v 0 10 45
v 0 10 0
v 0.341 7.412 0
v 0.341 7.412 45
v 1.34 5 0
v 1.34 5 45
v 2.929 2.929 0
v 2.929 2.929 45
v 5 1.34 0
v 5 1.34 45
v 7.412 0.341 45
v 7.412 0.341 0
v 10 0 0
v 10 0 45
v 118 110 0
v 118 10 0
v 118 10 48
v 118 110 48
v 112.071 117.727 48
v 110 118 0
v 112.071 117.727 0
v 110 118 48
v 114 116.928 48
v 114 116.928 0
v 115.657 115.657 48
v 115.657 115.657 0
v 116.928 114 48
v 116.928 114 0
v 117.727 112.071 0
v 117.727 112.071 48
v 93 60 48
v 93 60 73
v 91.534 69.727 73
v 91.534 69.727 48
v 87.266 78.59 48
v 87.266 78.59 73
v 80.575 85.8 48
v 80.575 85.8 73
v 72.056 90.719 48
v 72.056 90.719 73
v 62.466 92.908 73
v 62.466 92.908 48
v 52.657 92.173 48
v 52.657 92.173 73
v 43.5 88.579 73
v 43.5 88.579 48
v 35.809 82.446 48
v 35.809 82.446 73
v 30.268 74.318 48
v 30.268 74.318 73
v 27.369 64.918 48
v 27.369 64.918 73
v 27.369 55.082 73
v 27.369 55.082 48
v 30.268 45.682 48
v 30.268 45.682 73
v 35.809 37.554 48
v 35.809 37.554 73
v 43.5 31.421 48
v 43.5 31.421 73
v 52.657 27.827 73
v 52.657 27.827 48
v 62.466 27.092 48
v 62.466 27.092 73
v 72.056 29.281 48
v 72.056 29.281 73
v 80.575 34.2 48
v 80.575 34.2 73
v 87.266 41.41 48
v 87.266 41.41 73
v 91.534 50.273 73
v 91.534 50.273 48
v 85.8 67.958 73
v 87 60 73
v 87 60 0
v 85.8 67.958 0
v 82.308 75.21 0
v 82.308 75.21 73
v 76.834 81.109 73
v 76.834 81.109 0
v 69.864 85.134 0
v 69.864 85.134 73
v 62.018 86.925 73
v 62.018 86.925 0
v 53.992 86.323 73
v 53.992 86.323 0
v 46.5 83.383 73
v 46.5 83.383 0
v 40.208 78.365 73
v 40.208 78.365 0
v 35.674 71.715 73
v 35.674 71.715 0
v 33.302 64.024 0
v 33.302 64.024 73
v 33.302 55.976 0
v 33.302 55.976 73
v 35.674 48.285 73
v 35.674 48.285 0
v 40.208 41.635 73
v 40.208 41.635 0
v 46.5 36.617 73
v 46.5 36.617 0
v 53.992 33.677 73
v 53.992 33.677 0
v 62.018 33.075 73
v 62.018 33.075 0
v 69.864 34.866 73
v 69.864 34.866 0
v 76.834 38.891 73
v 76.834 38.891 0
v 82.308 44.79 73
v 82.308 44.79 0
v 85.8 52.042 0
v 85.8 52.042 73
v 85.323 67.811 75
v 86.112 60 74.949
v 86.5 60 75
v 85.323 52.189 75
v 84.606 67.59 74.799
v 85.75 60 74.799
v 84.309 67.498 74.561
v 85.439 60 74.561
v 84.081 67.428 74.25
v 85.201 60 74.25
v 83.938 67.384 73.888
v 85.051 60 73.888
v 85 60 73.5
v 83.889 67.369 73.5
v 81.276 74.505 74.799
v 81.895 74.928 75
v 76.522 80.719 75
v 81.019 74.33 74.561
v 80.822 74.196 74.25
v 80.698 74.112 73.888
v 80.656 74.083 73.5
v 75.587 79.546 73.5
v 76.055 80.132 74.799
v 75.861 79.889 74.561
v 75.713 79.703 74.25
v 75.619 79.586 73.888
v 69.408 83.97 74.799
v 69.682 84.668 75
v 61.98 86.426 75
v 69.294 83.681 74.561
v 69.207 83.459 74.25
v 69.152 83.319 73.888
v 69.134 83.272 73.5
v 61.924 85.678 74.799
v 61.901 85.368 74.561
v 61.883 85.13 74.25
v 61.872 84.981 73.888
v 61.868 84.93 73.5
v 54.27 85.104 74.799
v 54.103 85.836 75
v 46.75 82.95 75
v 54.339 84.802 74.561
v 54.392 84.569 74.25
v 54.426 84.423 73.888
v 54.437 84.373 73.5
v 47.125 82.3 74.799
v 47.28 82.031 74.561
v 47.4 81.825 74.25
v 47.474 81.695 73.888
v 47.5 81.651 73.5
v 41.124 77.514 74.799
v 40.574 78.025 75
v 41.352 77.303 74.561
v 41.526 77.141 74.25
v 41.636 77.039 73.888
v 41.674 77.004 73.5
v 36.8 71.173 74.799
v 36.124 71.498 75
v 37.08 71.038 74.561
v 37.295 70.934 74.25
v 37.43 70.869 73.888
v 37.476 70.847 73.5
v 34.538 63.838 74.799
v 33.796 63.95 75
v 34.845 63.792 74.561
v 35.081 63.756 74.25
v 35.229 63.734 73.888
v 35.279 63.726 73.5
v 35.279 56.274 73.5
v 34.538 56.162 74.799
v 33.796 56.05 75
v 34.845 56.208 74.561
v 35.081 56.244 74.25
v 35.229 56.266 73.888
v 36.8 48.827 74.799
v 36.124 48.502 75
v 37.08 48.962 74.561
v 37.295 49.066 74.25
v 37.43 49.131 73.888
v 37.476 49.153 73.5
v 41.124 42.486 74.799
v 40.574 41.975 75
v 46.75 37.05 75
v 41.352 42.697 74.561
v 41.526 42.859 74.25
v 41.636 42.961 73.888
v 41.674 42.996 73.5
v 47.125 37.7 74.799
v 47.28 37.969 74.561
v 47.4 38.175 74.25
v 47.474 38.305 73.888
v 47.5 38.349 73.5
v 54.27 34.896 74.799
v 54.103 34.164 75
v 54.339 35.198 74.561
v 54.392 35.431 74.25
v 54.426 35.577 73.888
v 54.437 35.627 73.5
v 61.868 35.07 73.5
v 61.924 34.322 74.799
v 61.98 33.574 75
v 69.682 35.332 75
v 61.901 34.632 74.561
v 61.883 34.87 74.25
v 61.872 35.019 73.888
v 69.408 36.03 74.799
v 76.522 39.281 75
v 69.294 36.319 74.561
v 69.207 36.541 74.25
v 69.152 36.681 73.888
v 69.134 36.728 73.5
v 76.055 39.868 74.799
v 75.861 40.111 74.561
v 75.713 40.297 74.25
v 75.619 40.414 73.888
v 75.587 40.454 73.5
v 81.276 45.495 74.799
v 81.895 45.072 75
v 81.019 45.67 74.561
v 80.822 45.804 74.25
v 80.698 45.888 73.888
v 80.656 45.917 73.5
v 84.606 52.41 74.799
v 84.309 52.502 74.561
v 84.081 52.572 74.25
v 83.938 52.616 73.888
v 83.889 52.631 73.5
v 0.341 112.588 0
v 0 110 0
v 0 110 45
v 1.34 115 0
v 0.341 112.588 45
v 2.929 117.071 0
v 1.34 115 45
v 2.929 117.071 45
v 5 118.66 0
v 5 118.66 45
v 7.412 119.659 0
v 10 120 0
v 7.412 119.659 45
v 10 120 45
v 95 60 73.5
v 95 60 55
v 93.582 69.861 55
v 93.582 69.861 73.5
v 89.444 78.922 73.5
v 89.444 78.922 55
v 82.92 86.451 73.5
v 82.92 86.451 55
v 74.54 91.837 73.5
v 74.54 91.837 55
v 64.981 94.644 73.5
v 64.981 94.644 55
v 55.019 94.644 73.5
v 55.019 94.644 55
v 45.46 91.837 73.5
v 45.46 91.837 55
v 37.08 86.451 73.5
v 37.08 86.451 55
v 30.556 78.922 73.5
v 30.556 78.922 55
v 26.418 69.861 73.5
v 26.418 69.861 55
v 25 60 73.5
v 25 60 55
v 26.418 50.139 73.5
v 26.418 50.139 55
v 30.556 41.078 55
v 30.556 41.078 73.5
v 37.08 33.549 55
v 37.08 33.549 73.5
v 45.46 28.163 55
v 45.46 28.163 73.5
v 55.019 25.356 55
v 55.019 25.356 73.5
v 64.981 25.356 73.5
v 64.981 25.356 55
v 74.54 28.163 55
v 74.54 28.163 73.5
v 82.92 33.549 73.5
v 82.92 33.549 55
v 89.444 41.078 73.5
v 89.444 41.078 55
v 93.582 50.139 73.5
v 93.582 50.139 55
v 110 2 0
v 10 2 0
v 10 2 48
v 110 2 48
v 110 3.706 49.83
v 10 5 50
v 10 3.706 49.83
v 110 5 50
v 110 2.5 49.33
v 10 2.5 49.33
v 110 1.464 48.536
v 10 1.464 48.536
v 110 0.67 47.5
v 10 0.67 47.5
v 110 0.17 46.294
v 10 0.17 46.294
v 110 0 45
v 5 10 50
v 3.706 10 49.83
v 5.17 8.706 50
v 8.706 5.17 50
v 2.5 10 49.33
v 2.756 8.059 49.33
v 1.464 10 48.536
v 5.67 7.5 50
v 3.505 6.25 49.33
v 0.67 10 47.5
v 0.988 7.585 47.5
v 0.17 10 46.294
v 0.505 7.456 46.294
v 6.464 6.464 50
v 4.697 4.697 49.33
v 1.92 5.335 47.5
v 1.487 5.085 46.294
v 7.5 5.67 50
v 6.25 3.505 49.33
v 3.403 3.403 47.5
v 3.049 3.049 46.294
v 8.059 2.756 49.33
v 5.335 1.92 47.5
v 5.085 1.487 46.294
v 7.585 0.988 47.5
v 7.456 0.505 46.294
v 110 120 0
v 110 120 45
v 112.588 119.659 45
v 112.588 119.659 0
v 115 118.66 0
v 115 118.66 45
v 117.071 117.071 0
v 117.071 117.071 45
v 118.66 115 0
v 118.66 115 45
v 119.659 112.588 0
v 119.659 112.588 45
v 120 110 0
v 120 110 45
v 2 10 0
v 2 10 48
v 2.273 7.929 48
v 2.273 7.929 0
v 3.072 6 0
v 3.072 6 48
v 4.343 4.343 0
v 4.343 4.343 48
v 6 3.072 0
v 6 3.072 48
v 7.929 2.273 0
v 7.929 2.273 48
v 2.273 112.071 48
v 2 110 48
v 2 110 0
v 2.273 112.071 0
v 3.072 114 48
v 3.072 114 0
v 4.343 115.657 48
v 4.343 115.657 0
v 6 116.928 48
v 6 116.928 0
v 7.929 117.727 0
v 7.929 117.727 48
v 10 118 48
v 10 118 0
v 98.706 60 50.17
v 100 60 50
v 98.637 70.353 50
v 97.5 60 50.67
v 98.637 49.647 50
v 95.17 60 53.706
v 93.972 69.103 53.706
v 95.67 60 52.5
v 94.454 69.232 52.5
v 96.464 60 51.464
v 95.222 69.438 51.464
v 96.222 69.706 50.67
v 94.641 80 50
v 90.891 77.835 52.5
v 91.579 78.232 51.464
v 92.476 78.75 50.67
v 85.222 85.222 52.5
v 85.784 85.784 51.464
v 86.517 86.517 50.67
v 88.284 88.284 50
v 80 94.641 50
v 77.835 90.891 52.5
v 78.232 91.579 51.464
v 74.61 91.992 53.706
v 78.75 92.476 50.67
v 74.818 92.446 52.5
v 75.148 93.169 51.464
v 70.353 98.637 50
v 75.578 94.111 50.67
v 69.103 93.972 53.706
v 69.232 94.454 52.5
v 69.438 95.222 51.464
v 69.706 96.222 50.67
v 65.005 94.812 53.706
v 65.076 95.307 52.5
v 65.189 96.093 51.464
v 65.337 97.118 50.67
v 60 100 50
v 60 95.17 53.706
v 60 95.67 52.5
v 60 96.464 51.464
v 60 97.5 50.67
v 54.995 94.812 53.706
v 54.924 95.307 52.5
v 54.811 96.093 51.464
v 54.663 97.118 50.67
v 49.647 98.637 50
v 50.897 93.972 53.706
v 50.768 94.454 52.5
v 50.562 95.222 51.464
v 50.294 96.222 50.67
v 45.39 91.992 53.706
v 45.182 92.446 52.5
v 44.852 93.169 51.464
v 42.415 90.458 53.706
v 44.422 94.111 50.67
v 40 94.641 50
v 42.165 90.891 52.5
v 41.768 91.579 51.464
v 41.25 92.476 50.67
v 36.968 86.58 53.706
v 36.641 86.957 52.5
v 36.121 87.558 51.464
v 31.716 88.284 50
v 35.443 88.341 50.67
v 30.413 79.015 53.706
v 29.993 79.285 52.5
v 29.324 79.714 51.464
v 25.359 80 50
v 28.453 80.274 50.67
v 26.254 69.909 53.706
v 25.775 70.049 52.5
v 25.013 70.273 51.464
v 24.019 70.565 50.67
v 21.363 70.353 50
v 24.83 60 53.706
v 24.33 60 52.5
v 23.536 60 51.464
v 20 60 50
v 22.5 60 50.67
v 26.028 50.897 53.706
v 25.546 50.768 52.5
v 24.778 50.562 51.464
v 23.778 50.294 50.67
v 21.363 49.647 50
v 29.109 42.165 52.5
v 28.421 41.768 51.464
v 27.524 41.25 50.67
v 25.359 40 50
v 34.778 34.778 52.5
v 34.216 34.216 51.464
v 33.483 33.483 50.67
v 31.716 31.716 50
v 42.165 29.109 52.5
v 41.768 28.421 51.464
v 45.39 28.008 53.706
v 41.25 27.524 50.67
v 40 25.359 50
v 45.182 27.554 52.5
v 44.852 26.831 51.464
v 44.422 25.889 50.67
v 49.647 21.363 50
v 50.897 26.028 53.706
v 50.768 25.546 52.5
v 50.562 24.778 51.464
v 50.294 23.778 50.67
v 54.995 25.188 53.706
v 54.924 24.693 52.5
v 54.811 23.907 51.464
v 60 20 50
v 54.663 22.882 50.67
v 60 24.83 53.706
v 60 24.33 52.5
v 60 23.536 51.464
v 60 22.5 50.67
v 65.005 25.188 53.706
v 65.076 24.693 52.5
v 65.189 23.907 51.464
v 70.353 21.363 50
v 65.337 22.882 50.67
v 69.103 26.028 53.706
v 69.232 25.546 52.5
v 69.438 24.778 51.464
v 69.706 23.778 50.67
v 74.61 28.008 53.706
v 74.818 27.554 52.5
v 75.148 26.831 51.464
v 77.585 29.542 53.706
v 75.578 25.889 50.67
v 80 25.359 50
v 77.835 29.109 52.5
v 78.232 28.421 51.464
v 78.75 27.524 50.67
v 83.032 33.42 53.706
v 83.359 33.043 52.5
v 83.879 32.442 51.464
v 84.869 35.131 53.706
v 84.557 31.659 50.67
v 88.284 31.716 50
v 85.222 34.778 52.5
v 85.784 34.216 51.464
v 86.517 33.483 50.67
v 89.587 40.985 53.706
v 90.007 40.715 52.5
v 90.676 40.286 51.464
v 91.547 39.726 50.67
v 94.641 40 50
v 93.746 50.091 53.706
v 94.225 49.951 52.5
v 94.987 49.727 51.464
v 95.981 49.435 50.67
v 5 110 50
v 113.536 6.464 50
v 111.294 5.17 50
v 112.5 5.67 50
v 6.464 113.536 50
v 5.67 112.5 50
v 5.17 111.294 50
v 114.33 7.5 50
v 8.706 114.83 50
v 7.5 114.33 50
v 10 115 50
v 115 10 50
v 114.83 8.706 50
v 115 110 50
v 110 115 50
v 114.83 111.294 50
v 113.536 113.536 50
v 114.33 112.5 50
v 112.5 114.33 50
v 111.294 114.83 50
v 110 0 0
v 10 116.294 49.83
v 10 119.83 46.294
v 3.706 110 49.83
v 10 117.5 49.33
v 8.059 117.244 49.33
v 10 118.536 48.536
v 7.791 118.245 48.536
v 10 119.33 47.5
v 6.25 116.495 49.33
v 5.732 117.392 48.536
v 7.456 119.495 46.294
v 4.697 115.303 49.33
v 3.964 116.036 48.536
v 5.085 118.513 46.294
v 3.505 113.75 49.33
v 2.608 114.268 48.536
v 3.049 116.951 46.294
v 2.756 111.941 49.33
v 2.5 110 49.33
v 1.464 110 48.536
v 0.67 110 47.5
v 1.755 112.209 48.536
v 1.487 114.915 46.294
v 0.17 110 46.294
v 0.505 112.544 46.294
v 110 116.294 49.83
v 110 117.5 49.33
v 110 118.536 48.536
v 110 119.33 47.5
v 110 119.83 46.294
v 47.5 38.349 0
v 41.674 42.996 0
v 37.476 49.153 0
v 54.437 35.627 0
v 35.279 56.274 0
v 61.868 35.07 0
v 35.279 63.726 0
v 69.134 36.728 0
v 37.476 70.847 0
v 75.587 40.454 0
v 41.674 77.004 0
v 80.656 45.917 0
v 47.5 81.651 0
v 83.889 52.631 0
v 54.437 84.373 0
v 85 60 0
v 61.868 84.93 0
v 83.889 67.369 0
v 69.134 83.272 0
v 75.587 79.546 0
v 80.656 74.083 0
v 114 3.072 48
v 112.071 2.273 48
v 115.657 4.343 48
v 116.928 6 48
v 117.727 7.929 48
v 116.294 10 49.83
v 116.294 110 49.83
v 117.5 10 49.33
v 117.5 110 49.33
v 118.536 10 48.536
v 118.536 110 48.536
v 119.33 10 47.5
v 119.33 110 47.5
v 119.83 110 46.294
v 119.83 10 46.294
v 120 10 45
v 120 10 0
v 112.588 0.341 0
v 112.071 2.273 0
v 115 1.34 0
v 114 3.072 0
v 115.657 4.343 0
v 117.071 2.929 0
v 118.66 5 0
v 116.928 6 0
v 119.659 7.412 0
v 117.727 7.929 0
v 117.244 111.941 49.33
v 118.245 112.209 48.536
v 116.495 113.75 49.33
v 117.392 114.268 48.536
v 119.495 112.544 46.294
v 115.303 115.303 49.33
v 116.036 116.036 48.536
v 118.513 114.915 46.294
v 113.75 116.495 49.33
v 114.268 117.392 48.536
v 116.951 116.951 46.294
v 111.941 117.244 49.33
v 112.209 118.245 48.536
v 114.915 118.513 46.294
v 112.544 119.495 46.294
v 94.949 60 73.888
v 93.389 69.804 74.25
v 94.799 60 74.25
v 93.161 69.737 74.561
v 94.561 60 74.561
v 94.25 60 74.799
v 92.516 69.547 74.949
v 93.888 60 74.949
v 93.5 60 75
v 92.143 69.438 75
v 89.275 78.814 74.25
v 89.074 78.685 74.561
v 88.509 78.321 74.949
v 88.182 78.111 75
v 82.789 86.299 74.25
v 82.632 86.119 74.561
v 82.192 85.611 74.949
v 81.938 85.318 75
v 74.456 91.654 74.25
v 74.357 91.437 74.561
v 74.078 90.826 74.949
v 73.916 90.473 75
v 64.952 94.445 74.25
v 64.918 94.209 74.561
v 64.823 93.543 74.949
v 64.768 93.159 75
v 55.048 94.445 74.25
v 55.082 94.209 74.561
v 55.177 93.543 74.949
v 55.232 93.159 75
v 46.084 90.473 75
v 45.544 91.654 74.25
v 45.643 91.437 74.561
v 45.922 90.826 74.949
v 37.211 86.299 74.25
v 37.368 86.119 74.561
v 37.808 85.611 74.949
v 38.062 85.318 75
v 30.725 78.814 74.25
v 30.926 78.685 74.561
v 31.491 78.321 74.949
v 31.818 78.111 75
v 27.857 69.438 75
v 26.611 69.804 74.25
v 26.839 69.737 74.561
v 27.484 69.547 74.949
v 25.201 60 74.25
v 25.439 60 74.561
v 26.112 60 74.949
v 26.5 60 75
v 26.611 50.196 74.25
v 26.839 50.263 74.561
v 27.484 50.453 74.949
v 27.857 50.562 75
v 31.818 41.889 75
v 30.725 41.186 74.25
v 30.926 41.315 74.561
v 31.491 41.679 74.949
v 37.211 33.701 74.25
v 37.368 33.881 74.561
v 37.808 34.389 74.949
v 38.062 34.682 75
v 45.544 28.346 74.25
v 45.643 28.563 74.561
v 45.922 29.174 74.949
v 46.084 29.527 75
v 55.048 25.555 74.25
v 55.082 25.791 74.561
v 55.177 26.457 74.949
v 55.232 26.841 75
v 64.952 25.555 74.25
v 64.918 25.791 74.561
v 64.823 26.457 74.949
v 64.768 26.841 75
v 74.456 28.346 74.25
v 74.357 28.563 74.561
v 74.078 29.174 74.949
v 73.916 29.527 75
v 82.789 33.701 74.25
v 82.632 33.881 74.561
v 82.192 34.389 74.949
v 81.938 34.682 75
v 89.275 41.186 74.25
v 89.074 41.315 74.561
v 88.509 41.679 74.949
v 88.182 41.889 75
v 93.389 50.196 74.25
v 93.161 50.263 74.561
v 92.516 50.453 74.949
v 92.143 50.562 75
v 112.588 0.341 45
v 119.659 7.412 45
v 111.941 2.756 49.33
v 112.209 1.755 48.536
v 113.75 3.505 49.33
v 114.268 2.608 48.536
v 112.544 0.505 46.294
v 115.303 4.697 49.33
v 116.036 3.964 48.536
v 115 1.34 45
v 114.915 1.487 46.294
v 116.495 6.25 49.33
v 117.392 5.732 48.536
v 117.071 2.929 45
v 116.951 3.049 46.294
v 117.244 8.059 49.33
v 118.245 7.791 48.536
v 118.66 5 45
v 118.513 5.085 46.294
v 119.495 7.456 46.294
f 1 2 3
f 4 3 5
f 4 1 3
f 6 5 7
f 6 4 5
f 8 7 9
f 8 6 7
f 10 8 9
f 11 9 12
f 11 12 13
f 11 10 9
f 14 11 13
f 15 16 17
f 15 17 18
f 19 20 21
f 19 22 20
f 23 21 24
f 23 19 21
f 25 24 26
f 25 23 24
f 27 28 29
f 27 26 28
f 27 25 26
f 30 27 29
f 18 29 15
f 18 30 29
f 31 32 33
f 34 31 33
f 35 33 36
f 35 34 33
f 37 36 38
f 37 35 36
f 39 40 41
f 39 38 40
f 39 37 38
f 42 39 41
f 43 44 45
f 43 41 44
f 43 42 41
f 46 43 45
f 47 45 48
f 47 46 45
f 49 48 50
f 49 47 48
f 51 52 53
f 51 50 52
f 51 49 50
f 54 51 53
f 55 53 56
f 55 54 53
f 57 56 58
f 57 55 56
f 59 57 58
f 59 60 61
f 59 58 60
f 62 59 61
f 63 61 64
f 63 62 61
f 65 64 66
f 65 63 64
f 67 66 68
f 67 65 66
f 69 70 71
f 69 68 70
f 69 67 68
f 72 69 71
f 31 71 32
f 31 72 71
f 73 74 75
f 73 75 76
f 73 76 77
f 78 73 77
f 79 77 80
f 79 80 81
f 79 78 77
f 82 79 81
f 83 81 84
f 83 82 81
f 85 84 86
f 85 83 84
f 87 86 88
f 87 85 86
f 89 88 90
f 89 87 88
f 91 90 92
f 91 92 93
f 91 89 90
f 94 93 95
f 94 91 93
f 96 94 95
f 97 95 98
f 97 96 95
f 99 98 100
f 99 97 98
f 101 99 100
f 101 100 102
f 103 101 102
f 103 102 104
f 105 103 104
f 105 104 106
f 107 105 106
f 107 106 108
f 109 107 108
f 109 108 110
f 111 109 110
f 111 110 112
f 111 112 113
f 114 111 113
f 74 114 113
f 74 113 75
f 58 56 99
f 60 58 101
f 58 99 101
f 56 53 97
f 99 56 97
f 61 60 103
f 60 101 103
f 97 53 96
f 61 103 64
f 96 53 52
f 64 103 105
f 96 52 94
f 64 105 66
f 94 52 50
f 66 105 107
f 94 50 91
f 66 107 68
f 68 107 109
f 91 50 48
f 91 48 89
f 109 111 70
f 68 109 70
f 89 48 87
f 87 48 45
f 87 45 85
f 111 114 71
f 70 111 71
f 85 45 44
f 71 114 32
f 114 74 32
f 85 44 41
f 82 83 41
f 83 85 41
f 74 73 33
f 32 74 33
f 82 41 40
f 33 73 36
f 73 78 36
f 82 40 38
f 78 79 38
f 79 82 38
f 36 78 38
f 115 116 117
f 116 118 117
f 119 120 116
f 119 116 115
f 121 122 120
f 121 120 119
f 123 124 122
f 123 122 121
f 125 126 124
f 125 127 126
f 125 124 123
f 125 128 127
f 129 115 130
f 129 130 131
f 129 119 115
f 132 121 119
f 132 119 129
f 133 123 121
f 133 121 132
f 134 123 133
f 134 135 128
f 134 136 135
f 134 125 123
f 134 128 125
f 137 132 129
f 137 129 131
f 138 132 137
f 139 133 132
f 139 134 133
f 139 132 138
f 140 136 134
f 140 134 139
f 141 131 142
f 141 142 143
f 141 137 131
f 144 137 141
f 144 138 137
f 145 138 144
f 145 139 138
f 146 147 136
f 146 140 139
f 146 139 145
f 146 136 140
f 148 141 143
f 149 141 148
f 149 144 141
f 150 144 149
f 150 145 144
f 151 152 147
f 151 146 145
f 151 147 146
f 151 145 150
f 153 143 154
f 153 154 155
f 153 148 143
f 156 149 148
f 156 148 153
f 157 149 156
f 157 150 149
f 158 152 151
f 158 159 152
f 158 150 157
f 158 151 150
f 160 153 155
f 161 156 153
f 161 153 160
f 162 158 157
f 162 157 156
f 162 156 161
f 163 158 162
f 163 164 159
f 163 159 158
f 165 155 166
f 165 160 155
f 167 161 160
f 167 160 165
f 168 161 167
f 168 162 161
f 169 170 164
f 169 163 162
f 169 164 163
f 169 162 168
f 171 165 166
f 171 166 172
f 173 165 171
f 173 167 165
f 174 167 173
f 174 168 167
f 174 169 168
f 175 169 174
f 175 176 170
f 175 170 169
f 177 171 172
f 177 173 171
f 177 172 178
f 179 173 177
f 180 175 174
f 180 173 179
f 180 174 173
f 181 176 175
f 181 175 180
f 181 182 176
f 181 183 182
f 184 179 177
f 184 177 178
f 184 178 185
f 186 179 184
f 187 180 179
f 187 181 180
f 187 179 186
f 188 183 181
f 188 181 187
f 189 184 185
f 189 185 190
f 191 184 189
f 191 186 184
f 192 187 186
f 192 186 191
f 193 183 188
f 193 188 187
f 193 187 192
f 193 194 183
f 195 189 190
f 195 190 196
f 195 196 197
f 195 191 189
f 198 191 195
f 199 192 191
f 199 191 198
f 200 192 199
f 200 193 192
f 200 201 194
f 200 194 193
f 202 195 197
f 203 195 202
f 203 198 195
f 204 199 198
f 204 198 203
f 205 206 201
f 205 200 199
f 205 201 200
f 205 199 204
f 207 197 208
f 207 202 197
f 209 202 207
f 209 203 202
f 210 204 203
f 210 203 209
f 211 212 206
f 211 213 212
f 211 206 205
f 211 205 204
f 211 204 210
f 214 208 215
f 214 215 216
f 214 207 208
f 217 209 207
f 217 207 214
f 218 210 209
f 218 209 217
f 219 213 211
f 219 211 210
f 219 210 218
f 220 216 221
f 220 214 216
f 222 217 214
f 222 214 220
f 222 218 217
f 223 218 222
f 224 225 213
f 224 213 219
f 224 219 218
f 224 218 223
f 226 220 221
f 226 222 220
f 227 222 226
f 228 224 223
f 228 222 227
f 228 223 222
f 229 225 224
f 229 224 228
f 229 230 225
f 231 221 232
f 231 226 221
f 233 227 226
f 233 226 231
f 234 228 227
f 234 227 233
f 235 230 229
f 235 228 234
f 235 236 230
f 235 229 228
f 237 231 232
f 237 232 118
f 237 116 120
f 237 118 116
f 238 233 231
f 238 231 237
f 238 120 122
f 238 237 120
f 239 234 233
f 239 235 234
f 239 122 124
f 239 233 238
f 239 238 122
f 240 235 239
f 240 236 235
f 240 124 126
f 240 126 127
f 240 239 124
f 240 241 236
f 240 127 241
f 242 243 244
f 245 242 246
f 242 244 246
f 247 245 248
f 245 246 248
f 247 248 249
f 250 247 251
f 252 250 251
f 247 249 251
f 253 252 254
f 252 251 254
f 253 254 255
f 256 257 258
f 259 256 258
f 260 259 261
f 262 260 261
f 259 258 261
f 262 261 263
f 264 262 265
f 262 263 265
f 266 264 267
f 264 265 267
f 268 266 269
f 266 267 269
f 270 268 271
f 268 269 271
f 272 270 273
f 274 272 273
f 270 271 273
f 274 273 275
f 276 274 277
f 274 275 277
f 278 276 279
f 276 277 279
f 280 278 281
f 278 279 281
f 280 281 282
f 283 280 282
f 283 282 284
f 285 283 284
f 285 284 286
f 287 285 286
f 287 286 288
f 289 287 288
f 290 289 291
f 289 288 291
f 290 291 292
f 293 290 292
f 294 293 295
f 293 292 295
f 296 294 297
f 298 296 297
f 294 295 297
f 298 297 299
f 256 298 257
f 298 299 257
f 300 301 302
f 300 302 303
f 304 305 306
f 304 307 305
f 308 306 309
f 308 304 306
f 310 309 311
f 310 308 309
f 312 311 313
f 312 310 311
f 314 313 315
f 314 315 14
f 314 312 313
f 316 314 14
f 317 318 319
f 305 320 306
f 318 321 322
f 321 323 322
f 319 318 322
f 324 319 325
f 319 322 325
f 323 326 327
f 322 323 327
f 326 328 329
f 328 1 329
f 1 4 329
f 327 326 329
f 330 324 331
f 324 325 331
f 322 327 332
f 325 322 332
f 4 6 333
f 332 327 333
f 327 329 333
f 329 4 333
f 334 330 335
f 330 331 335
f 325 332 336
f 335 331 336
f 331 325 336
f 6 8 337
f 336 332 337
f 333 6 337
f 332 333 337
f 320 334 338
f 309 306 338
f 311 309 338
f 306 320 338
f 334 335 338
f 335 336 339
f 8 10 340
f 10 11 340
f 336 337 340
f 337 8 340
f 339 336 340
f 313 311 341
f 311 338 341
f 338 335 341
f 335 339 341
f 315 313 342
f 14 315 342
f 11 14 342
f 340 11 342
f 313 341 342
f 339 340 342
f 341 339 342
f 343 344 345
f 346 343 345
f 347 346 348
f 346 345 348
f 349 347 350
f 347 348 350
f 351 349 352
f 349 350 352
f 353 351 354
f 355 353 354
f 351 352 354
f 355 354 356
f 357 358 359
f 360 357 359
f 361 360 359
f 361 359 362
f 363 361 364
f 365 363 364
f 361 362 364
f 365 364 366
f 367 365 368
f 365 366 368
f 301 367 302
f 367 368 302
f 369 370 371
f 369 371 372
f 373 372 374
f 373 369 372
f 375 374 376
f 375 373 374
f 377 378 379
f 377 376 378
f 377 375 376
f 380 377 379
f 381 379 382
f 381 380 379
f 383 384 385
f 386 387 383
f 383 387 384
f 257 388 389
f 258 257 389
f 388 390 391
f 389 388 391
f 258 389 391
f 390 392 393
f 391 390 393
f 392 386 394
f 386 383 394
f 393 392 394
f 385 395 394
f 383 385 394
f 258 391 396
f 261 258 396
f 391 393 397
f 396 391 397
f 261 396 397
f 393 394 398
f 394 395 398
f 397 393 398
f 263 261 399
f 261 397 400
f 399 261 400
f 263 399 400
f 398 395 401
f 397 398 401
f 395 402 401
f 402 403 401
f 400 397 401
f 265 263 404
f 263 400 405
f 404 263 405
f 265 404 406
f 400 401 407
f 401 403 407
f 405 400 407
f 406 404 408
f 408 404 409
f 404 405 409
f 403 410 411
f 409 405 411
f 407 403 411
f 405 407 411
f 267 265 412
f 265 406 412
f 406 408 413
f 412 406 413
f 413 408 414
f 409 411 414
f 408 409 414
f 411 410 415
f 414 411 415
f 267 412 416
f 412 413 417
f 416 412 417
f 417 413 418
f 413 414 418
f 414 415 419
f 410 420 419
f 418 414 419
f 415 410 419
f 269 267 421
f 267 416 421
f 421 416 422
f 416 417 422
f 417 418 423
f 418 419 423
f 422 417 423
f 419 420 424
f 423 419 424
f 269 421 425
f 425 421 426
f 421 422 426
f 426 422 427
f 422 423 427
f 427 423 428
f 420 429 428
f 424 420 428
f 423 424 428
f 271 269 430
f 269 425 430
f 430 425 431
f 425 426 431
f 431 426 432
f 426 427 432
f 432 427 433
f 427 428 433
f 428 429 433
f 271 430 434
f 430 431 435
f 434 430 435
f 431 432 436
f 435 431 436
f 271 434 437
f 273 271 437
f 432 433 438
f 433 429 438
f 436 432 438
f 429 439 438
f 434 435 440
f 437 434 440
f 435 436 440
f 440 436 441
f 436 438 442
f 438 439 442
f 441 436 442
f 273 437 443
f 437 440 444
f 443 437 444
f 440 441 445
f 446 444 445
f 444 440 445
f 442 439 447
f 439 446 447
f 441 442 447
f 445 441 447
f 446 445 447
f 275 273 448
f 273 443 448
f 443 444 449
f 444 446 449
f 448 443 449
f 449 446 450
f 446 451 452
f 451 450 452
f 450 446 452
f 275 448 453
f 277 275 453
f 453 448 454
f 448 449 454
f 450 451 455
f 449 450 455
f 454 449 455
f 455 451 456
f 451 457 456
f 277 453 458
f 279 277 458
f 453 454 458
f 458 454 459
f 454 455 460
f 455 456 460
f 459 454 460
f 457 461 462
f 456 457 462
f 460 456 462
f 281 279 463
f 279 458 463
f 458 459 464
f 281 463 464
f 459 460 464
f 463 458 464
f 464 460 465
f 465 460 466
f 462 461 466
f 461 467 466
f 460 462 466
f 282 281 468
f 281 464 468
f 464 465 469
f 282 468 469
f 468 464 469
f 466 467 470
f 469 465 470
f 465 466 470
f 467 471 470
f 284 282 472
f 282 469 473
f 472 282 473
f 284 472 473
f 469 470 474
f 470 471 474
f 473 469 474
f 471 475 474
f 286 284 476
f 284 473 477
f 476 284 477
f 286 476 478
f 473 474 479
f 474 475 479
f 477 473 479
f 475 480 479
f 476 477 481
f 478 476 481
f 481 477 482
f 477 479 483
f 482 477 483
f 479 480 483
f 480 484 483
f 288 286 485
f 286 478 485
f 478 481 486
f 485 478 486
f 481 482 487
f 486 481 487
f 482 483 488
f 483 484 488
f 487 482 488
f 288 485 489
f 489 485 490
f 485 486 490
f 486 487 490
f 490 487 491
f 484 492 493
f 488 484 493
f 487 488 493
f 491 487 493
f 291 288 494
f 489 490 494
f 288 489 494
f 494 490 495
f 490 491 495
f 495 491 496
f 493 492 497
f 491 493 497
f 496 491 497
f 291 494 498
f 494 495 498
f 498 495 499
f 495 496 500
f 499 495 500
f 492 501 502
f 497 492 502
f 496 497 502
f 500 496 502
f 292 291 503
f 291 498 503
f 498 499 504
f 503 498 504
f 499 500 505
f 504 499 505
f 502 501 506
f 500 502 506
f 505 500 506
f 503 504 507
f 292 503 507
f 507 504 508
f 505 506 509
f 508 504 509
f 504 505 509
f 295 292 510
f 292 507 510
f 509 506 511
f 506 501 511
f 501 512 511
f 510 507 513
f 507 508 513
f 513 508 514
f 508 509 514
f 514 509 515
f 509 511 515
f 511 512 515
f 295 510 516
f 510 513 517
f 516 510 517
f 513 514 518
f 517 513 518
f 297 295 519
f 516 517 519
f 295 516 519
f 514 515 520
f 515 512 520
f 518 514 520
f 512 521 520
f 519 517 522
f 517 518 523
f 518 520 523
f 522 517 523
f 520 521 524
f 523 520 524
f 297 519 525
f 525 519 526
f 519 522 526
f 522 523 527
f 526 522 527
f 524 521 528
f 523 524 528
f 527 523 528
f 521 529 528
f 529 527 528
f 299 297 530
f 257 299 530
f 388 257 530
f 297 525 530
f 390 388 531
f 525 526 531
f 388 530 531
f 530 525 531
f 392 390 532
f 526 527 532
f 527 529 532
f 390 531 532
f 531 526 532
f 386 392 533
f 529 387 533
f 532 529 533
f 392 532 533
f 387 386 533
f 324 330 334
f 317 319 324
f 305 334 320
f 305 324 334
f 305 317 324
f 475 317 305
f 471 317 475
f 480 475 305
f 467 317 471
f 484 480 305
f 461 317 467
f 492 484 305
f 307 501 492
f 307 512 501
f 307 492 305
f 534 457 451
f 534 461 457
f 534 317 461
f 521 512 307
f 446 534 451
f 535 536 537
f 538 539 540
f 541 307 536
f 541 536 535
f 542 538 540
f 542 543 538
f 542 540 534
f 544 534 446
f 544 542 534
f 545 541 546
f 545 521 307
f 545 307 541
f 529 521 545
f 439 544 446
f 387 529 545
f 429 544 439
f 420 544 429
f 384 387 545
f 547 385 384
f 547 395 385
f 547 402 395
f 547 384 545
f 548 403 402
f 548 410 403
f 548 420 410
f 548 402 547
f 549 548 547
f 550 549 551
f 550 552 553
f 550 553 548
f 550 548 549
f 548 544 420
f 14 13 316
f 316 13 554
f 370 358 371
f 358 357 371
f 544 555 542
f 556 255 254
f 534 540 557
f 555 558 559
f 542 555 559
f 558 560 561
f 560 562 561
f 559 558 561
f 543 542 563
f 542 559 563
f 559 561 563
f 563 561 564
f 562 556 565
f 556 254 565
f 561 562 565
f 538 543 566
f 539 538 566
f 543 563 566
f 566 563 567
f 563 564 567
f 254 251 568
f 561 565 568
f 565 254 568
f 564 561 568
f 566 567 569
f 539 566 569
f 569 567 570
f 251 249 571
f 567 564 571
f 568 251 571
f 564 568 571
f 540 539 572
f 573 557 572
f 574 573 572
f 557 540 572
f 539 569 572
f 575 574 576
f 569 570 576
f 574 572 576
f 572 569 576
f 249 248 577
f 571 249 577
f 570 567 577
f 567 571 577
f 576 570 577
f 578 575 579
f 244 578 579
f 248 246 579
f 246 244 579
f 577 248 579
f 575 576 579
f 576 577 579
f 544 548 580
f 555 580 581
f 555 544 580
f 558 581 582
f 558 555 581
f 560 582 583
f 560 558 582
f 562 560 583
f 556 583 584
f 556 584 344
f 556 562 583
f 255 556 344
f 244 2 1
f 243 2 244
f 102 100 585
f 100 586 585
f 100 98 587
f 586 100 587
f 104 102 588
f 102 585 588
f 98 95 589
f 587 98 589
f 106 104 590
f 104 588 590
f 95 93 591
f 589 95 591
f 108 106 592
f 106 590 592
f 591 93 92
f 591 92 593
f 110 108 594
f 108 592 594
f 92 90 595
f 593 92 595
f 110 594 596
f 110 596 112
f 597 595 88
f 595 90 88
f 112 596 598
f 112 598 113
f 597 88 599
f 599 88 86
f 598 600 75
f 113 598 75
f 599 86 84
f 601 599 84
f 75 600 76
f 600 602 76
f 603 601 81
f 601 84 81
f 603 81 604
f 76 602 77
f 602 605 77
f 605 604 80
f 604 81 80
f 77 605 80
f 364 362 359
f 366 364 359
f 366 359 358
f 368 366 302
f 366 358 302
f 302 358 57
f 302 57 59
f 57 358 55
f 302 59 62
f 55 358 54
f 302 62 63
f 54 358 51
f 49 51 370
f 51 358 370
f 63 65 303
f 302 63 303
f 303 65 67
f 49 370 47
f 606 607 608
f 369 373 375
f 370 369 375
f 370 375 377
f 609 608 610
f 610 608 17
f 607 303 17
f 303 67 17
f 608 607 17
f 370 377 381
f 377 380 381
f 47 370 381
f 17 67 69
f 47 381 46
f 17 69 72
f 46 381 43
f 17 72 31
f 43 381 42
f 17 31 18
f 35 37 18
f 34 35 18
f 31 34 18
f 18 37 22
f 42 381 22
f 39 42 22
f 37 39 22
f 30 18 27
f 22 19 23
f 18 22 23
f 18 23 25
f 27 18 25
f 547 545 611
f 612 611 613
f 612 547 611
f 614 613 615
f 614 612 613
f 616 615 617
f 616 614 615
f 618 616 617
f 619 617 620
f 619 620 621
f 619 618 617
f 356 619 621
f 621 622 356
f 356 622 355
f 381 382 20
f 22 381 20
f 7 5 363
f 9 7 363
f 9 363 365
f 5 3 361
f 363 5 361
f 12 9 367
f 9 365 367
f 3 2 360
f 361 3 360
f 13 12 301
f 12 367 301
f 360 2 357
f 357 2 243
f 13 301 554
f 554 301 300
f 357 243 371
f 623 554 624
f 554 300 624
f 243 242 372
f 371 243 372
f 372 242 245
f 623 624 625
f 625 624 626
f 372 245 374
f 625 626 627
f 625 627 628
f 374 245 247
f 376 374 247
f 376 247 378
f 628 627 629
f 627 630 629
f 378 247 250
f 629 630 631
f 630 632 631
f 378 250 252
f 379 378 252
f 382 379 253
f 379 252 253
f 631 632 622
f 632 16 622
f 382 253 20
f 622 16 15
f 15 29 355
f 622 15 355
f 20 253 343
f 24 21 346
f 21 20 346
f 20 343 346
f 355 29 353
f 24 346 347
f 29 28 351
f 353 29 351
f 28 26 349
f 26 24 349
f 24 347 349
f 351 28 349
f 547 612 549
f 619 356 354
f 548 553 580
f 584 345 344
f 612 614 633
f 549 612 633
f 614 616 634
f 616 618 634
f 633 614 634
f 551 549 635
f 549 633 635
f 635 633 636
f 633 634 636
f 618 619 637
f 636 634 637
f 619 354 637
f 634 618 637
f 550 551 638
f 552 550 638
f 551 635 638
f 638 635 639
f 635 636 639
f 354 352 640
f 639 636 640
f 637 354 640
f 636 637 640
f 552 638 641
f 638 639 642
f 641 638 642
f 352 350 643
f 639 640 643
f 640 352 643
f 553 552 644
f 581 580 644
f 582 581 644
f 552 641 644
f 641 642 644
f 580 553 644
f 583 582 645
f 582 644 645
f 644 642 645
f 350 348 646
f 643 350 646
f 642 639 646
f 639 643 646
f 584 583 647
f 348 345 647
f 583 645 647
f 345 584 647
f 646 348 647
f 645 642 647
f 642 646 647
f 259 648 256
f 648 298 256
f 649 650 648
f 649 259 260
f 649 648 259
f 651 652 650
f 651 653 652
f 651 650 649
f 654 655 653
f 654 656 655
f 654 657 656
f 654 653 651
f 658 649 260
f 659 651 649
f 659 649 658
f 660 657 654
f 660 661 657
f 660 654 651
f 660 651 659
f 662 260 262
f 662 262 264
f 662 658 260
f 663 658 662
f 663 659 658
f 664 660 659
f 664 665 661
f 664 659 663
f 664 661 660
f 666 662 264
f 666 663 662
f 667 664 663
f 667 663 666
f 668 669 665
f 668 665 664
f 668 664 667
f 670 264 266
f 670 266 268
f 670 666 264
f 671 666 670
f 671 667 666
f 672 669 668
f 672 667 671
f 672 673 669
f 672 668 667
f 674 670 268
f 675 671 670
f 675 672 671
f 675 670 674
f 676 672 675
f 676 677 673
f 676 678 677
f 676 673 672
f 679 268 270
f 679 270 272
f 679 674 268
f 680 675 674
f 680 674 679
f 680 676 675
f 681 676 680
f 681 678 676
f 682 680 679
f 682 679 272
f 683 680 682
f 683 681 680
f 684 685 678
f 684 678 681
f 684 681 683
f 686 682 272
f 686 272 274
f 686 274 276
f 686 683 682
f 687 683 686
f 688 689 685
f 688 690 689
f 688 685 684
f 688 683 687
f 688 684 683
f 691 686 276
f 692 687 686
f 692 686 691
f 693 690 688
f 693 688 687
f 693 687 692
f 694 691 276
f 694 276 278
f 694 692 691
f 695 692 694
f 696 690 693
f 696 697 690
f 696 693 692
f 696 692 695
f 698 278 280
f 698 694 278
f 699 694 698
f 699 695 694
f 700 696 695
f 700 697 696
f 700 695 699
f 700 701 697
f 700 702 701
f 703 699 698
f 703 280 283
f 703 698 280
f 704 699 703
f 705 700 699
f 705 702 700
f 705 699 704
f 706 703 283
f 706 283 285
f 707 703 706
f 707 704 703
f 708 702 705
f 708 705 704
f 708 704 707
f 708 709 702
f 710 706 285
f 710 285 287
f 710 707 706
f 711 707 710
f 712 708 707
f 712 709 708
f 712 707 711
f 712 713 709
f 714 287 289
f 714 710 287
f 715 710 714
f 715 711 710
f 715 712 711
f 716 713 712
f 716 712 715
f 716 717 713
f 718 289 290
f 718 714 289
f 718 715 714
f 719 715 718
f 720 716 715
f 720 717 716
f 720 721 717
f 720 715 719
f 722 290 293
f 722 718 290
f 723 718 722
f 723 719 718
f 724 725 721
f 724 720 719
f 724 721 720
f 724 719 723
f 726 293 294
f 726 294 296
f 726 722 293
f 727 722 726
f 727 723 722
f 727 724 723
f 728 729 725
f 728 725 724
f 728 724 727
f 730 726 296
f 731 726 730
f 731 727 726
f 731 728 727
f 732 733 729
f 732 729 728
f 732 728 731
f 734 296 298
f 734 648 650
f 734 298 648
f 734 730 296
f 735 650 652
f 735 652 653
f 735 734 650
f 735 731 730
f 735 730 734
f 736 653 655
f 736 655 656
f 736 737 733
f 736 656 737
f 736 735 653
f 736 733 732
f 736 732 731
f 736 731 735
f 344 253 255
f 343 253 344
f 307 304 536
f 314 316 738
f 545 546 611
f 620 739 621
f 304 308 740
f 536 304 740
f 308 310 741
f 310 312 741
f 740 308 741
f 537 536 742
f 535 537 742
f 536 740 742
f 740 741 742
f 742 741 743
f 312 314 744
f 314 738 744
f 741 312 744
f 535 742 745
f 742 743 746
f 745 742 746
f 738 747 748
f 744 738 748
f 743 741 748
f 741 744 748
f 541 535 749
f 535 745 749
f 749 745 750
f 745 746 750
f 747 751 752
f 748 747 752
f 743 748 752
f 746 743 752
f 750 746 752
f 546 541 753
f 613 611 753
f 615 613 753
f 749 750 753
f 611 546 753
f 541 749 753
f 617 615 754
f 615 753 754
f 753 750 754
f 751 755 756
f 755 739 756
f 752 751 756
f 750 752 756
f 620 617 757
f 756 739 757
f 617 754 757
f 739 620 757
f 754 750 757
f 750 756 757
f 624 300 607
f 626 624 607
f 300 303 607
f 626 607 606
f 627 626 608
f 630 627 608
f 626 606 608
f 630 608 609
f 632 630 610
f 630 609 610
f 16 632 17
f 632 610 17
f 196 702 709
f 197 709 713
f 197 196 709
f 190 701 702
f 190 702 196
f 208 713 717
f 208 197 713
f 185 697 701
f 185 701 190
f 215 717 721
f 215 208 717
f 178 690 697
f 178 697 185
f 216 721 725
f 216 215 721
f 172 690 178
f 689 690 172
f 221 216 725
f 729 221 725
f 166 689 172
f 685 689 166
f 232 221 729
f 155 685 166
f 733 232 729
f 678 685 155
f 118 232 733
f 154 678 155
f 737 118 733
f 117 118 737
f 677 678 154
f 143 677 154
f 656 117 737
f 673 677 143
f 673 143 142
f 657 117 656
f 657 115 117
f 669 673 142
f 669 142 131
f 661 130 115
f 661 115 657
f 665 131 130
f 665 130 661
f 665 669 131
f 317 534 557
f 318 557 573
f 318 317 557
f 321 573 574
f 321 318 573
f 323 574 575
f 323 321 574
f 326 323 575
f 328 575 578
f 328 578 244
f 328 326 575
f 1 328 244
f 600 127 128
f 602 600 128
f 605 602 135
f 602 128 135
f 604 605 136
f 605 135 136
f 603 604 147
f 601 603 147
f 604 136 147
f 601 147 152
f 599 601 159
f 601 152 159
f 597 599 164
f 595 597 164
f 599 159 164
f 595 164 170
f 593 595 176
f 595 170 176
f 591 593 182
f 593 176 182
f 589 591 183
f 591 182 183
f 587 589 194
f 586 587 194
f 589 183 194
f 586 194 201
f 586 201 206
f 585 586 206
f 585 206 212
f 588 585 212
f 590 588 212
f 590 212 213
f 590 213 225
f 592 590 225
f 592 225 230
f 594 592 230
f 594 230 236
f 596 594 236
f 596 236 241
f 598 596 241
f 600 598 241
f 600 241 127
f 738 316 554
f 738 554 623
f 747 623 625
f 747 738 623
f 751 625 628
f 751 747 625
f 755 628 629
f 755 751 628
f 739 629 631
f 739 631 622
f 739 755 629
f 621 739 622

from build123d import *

# Parameters (mm, degrees)
SKETCH1_W           = 120
SKETCH1_H           = 120
BOSS_EXTRUDE1_DEPTH = 50
SKETCH3_R           = 35
BOSS_EXTRUDE2_DEPTH = 25
SKETCH4_R           = 25
CUT_EXTRUDE1_DEPTH  = 76
FILLET1_R           = 10
SHELL1_T            = -2
FILLET8_R           = 1.5
FILLET9_R           = 5


with BuildPart() as part:
    # Sketch1 → Boss-Extrude1 (new body)
    with BuildSketch(Plane.XY):
        with Locations((60, 60)):
            Rectangle(SKETCH1_W, SKETCH1_H)
    extrude(amount=BOSS_EXTRUDE1_DEPTH)

    # Sketch3 → Boss-Extrude2 (add)
    with BuildSketch(Plane.XY.offset(50)):
        with Locations((60, 60)):
            Circle(SKETCH3_R)
    extrude(amount=BOSS_EXTRUDE2_DEPTH)

    # Sketch4 → Cut-Extrude1 (cut, through all)
    with BuildSketch(Plane.XY.offset(75)):
        with Locations((60, 60)):
            Circle(SKETCH4_R)
    extrude(amount=-CUT_EXTRUDE1_DEPTH, mode=Mode.SUBTRACT)

    # Fillet1
    fillet1_edges = [part.edges().sort_by_distance(p)[0] for p in [
        (0, 120, 25),
        (120, 120, 25),
        (120, 0, 25),
        (0, 0, 25),
    ]]
    fillet(fillet1_edges, radius=FILLET1_R)

    # Shell1
    shell1_openings = [part.faces().sort_by_distance(p)[0] for p in [
        (85, 60, 0),
    ]]
    offset(amount=SHELL1_T, openings=shell1_openings, kind=Kind.INTERSECTION)

    # Fillet8
    fillet8_edges = [part.edges().sort_by_distance(p)[0] for p in [
        (25, 60, 75),
        (35, 60, 75),
    ]]
    fillet(fillet8_edges, radius=FILLET8_R)

    # Fillet9
    fillet9_edges = [part.edges().sort_by_distance(p)[0] for p in [
        (25, 60, 50),
        (60, 0, 50),
        (0, 60, 50),
        (120, 60, 50),
        (60, 120, 50),
        (117.071067812, 117.071067812, 50),
        (117.071067812, 2.928932188, 50),
        (2.928932188, 117.071067812, 50),
        (2.928932188, 2.928932188, 50),
    ]]
    fillet(fillet9_edges, radius=FILLET9_R)


solid = part.part
